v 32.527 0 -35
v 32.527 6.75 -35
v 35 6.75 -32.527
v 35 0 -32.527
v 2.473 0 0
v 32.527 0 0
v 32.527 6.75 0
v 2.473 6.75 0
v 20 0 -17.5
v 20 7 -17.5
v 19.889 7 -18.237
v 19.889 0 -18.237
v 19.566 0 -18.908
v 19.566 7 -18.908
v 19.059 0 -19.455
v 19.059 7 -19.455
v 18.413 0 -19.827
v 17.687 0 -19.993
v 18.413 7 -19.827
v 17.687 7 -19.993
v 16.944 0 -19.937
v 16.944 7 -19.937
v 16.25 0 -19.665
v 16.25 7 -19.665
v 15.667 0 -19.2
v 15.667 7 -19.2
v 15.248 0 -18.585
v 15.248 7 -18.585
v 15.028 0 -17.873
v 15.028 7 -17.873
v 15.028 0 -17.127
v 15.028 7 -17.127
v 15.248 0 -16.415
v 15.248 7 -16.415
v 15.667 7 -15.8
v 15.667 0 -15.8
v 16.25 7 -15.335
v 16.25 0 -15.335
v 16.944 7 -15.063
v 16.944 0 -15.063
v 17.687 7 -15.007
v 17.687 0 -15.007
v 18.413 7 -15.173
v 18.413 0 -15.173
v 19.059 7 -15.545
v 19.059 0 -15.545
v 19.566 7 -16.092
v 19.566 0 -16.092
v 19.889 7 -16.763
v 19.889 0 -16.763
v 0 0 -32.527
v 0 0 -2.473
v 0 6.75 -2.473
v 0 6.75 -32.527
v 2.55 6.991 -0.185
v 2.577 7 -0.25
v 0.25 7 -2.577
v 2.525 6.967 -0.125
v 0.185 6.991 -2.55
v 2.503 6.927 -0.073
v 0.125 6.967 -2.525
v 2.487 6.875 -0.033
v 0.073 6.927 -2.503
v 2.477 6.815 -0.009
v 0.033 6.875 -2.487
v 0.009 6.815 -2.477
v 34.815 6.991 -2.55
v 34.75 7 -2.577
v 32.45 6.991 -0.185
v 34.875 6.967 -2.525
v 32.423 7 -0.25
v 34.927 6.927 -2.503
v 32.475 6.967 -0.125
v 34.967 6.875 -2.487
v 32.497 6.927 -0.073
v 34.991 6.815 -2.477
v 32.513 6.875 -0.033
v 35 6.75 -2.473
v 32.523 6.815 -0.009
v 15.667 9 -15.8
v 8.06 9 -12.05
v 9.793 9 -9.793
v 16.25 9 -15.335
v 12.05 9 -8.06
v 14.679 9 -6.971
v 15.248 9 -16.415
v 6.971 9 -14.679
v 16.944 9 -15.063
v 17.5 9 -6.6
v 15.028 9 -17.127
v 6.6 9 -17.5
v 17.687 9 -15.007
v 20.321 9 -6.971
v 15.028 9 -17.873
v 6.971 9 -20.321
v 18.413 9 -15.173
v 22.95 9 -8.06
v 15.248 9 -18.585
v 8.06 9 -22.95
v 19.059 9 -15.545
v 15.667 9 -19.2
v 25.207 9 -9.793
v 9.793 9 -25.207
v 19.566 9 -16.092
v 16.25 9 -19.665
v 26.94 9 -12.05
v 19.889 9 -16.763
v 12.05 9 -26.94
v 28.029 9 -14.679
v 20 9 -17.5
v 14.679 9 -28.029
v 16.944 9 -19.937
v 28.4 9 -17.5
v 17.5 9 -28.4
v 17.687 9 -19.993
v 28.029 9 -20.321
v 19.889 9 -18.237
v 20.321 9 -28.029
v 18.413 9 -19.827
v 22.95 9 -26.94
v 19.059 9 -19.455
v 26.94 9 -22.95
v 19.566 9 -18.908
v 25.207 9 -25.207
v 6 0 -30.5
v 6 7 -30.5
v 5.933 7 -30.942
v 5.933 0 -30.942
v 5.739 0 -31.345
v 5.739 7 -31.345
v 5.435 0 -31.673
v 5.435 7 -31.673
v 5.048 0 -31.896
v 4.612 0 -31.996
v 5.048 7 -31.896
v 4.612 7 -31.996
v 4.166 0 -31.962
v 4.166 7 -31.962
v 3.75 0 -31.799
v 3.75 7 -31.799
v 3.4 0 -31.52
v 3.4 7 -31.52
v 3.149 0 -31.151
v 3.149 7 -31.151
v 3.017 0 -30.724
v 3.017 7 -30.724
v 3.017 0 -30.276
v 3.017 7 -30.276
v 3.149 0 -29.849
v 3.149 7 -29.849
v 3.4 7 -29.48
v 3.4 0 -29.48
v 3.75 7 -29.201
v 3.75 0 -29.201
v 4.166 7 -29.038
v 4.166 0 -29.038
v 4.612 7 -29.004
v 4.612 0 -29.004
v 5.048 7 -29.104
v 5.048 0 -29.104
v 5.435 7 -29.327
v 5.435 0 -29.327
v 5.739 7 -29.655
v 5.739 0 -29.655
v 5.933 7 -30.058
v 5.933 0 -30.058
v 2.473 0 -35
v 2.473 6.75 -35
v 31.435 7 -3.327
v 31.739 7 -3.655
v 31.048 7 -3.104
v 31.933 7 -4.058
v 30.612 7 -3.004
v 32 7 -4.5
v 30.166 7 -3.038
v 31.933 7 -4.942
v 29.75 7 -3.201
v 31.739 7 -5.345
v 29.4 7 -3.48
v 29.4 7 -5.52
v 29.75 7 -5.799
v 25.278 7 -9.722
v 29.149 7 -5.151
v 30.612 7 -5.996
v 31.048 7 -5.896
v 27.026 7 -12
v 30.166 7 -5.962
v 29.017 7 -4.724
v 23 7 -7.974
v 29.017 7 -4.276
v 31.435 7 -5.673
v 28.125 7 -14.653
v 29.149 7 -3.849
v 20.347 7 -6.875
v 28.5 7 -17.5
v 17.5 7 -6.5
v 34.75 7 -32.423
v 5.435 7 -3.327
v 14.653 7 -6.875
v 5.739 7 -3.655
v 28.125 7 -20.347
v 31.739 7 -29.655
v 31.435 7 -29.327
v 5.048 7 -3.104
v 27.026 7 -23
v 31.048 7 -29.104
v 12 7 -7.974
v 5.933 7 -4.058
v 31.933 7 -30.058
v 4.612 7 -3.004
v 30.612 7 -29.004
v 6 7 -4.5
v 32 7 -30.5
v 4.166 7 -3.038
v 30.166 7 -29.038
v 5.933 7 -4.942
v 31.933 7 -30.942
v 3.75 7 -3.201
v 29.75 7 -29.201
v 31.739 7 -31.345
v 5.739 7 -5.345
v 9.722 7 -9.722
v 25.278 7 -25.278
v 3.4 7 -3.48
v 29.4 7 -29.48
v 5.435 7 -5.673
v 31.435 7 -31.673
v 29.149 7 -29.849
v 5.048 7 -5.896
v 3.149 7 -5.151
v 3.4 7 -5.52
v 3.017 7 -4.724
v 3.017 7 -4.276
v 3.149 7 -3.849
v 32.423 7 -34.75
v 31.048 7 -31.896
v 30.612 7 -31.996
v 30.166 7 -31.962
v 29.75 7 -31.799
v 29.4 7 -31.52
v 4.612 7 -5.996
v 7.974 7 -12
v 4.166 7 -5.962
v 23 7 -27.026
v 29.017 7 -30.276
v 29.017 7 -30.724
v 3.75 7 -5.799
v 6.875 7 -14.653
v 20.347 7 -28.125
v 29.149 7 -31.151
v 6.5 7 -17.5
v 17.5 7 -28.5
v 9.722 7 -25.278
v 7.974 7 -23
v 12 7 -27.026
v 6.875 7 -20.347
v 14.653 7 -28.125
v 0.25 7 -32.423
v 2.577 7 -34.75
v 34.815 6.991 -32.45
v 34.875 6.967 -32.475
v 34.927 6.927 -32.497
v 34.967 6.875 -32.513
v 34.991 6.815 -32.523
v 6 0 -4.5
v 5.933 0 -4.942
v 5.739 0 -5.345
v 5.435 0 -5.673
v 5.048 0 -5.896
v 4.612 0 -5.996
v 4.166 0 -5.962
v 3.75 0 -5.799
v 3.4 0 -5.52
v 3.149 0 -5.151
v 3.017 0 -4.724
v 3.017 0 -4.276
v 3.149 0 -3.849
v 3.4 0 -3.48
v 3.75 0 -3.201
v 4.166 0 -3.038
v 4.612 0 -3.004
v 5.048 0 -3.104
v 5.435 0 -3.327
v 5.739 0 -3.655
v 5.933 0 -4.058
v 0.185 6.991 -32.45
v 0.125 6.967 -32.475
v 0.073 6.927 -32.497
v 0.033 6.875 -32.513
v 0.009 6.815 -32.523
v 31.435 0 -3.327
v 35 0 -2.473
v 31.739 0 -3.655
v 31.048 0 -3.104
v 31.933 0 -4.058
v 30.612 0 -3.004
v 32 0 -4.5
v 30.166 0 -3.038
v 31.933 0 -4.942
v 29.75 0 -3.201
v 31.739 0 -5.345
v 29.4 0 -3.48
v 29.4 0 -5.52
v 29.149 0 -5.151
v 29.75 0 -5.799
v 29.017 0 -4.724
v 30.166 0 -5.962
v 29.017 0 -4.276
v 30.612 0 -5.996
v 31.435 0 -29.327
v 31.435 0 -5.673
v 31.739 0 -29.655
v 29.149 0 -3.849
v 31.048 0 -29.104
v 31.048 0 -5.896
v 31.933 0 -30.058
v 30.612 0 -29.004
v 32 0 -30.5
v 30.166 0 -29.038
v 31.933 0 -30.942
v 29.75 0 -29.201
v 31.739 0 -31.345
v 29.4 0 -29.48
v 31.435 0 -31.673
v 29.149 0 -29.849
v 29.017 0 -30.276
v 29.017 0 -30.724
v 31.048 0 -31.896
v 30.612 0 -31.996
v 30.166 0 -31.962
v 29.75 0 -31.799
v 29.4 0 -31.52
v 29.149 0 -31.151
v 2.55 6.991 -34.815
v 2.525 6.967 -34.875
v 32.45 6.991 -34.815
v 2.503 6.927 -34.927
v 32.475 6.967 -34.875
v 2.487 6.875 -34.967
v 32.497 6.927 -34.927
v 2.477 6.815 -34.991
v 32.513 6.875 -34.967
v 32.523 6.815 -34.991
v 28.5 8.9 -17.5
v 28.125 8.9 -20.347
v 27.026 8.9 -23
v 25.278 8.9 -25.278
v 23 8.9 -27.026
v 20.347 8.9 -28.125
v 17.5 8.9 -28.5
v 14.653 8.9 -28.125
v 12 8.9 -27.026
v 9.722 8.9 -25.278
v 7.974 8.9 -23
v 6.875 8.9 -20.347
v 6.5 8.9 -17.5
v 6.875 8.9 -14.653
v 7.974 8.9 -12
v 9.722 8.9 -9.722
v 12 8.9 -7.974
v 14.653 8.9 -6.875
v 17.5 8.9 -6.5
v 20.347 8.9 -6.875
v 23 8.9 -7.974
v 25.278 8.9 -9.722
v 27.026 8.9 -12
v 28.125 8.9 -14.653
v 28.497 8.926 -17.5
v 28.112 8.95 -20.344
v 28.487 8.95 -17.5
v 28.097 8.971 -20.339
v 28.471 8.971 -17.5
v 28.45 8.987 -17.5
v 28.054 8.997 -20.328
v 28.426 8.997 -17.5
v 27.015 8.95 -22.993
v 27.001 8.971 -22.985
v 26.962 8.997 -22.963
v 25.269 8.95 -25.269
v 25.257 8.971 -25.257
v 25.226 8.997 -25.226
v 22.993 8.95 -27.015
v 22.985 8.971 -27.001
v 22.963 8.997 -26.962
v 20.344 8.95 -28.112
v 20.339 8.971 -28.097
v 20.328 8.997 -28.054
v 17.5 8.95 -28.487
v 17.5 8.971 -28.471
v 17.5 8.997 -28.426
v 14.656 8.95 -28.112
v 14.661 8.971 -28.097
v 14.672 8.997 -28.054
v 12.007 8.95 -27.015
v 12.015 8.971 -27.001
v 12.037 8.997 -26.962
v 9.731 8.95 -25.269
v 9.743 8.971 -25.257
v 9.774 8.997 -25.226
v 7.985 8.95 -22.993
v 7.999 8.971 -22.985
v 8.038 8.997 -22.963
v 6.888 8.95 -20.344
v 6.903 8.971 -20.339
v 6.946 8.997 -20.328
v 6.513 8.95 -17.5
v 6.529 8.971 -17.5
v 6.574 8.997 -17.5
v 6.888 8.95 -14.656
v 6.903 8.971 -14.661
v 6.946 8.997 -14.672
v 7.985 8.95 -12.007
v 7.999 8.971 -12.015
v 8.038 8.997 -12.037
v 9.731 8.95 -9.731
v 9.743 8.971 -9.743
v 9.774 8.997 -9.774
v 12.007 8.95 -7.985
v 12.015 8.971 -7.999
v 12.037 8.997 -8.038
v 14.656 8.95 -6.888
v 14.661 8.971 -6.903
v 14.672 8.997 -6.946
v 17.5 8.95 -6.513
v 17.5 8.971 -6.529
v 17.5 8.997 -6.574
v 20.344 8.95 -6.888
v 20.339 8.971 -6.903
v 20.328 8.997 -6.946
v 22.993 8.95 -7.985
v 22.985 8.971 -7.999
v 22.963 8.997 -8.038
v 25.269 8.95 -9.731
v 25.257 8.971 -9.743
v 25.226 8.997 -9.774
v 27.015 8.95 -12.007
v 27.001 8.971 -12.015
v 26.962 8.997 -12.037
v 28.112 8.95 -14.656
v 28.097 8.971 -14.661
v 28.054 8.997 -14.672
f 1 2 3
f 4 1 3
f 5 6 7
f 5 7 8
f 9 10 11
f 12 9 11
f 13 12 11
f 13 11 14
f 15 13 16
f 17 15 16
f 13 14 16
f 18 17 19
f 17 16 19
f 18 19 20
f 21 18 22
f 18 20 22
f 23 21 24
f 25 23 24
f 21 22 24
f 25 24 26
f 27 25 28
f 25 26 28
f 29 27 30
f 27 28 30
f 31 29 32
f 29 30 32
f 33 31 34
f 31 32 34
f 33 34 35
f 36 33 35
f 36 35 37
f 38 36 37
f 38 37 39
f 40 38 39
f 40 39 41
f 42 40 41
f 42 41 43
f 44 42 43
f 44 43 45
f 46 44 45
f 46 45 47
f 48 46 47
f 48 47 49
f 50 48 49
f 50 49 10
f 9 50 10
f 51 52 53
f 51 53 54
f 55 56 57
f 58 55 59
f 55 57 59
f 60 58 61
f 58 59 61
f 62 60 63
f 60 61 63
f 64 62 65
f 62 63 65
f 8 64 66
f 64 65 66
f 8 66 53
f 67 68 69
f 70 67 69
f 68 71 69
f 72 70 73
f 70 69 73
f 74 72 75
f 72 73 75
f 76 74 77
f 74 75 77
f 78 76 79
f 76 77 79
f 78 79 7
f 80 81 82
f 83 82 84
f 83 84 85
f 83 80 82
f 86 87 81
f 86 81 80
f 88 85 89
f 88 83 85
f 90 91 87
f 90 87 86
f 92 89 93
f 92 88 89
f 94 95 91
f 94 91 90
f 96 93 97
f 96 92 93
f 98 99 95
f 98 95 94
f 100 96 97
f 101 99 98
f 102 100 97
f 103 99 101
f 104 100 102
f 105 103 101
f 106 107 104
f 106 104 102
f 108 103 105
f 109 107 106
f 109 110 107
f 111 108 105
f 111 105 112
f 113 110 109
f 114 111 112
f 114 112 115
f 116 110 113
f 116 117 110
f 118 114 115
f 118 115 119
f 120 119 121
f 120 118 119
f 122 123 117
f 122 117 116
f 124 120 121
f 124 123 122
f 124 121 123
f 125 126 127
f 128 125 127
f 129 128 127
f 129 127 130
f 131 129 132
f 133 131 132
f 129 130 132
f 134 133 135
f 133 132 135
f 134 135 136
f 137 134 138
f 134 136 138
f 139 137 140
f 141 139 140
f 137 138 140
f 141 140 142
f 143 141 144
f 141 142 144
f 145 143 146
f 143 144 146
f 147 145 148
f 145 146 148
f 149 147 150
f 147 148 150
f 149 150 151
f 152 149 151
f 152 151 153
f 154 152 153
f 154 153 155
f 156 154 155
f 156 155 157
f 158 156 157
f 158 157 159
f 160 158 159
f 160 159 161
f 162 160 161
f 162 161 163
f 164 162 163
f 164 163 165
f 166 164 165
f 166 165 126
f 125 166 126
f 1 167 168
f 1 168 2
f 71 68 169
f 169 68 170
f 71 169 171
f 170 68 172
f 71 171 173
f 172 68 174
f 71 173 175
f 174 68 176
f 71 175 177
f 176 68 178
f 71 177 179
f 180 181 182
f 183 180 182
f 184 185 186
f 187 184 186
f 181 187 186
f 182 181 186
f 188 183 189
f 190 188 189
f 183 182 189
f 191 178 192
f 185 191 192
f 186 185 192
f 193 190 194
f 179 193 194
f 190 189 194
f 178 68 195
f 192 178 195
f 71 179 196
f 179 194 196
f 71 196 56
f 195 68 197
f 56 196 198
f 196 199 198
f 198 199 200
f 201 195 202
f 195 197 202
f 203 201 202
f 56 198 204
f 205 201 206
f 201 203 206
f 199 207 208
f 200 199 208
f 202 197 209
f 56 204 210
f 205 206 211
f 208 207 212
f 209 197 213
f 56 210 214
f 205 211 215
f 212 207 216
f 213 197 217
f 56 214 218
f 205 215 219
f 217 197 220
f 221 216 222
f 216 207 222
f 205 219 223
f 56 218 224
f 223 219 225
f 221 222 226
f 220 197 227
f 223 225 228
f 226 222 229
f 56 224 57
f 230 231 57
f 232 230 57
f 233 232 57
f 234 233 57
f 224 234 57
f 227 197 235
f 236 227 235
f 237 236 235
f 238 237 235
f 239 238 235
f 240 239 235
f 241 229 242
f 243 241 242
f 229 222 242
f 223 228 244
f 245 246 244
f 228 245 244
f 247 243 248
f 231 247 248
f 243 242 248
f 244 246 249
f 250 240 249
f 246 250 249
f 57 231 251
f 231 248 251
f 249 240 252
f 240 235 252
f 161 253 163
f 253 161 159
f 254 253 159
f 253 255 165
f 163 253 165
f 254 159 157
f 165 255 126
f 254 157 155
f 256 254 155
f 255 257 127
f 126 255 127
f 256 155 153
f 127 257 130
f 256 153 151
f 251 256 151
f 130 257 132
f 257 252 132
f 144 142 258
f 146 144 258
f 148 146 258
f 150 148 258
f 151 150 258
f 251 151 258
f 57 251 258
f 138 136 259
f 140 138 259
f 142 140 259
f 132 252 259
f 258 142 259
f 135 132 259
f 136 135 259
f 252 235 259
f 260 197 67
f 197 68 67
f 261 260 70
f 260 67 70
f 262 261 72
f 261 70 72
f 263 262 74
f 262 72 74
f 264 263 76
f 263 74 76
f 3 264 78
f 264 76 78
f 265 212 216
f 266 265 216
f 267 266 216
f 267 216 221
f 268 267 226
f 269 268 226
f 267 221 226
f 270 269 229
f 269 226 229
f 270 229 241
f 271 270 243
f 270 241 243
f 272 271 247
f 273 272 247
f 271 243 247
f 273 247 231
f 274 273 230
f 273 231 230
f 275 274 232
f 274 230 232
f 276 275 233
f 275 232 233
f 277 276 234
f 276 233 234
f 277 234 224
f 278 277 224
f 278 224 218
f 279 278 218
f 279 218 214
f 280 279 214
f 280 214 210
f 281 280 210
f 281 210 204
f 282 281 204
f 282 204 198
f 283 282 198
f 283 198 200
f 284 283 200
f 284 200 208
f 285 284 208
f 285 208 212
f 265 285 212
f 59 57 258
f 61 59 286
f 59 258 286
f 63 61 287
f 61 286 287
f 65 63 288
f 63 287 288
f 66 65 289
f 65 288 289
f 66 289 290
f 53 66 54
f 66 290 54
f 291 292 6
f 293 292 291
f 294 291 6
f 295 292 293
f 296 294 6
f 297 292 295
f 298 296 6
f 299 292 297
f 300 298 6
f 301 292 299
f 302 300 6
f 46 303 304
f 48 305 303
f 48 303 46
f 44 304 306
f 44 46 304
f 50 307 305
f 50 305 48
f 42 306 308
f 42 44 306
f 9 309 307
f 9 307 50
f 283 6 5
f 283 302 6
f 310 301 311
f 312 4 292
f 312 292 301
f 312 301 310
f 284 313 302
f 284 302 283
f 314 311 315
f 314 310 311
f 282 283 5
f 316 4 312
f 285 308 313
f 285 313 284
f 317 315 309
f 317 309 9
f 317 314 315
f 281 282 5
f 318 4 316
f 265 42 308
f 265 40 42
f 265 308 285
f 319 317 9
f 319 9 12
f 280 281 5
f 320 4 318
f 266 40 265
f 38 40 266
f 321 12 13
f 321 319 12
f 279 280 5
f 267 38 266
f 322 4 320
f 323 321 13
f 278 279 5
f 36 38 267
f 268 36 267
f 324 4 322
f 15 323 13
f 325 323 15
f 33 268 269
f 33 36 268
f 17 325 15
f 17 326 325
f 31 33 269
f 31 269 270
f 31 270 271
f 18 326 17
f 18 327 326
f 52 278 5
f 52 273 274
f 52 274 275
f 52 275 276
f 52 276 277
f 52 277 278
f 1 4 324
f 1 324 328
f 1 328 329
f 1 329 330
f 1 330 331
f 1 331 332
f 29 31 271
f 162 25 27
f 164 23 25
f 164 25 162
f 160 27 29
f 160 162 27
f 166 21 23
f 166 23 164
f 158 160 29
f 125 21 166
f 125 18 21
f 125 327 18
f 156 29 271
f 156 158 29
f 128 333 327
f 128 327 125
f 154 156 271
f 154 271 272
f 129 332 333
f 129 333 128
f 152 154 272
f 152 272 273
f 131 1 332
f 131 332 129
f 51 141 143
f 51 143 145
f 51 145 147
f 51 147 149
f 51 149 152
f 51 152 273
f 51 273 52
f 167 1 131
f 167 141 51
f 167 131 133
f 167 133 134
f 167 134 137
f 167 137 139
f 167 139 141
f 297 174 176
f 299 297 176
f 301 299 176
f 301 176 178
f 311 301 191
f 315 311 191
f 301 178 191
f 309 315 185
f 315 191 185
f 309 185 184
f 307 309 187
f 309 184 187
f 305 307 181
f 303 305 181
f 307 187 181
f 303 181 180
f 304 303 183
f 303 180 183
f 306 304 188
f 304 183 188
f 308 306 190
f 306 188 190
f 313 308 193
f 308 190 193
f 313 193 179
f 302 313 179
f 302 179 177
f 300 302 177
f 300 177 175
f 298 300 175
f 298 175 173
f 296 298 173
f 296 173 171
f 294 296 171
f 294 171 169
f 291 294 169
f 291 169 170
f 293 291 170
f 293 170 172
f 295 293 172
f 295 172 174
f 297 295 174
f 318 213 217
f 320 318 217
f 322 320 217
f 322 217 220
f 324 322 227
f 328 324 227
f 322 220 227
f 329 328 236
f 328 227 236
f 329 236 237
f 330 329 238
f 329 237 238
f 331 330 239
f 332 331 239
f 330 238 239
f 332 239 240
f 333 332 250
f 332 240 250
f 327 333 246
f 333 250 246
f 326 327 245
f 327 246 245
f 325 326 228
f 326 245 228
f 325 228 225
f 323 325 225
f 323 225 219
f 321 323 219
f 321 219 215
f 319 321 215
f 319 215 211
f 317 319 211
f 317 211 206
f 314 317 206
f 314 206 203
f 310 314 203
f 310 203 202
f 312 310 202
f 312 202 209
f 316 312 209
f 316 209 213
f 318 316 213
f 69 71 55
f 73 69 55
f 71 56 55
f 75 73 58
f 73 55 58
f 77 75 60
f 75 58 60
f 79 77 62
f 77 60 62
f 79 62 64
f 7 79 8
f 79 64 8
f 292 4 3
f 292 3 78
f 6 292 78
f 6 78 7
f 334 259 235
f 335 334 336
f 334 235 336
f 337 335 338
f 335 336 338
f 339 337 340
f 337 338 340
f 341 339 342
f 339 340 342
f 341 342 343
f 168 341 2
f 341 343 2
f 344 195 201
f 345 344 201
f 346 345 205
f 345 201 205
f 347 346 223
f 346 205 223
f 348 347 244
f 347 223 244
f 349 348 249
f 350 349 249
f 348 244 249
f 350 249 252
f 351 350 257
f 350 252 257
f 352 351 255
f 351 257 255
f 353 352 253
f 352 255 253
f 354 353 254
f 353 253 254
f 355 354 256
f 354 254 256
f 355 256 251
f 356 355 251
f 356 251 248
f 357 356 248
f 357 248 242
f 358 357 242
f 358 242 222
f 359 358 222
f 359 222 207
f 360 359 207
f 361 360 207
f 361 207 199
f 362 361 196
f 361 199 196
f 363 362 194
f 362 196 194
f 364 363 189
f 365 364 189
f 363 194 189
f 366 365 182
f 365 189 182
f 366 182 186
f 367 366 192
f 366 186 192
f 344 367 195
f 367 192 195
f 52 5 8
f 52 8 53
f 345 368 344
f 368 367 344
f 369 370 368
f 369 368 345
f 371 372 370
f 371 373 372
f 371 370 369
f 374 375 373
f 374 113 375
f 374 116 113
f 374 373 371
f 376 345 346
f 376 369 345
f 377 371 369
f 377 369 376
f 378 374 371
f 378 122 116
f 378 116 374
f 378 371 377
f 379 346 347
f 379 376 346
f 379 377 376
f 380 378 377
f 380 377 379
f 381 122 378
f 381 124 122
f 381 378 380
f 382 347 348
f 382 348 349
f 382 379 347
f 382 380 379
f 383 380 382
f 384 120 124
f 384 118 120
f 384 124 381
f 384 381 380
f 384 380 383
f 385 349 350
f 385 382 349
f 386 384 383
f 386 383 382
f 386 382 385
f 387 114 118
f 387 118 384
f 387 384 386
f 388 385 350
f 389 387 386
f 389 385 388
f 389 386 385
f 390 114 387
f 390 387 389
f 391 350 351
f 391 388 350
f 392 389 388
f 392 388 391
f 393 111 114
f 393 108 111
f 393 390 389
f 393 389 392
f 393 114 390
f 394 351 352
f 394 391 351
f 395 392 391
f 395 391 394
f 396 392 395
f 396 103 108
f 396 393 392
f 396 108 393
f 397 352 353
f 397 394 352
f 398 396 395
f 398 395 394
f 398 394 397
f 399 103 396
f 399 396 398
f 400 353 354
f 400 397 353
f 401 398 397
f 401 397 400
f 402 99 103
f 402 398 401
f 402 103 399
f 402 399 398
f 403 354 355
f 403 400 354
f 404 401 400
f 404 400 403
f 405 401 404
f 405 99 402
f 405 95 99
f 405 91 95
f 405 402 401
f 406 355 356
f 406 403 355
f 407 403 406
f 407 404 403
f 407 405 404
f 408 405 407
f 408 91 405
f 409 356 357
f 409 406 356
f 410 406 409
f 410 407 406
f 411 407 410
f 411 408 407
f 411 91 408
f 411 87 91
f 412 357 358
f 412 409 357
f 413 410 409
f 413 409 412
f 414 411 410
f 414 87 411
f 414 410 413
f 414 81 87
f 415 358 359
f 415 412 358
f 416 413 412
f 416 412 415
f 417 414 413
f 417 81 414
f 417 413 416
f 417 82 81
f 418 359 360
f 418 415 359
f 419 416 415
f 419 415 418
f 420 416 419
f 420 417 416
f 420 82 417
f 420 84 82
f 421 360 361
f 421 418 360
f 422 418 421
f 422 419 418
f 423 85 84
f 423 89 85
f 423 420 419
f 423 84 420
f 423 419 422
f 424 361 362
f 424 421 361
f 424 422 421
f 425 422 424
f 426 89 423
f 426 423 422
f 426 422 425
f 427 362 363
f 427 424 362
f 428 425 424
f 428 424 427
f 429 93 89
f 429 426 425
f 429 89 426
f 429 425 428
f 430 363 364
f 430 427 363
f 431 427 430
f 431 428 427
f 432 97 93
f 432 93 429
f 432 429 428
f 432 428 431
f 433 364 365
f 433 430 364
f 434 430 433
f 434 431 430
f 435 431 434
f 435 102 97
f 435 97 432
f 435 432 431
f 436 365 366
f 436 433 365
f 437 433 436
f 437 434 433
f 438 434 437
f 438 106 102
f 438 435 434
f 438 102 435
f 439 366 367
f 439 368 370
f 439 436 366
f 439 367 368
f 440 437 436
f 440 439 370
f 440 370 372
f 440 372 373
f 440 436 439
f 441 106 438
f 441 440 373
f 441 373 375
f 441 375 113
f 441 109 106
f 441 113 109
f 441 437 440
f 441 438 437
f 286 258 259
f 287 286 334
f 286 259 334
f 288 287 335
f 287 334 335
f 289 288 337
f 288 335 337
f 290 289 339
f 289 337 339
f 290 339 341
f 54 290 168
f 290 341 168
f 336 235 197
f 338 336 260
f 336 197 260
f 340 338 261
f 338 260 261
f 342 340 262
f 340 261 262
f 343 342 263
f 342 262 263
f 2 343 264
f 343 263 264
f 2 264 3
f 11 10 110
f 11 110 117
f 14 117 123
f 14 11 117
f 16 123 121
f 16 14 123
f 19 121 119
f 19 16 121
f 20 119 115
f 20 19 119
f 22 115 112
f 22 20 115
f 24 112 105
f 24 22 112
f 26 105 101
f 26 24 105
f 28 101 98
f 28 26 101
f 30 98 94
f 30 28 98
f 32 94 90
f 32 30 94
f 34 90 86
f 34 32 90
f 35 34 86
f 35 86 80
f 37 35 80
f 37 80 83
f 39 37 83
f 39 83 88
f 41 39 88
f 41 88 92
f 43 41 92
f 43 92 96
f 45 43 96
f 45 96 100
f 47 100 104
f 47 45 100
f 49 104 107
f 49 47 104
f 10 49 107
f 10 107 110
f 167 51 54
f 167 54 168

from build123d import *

# Parameters (mm, degrees)
SALIENTE_EXTRUIR1_DEPTH = 7
CROQUIS2_R              = 2.5
CORTAR_EXTRUIR1_DEPTH   = 8
CROQUIS3_R              = 1.5
CORTAR_EXTRUIR2_DEPTH   = 8
CROQUIS4_R              = 11
CROQUIS4_R_2            = 2.5
SALIENTE_EXTRUIR2_DEPTH = 2
REDONDEO1_R             = 0.1
REDONDEO3_R             = 0.25


with BuildPart() as part:
    # Croquis1 → Saliente-Extruir1 (new body)
    with BuildSketch(Plane(origin=(0, 0, 0), x_dir=(1, 0, 0), z_dir=(0, 1, 0))):
        Polygon((0, 32.526911935), (2.473088065, 35), (32.526911935, 35), (35, 32.526911935), (35, 2.473088065), (32.526911935, 0), (2.473088065, 0), (0, 2.473088065), align=None)
    extrude(amount=SALIENTE_EXTRUIR1_DEPTH)

    # Croquis2 → Cortar-Extruir1 (cut, through all)
    with BuildSketch(Plane(origin=(0, 7, 0), x_dir=(1, 0, 0), z_dir=(0, 1, 0))):
        with Locations((17.5, 17.5)):
            Circle(CROQUIS2_R)
    extrude(amount=-CORTAR_EXTRUIR1_DEPTH, mode=Mode.SUBTRACT)

    # Croquis3 → Cortar-Extruir2 (cut, through all)
    with BuildSketch(Plane(origin=(0, 7, 0), x_dir=(1, 0, 0), z_dir=(0, 1, 0))):
        with Locations((4.5, 30.5)):
            Circle(CROQUIS3_R)
        with Locations((30.5, 30.5)):
            Circle(CROQUIS3_R)
        with Locations((30.5, 4.5)):
            Circle(CROQUIS3_R)
        with Locations((4.5, 4.5)):
            Circle(CROQUIS3_R)
    extrude(amount=-CORTAR_EXTRUIR2_DEPTH, mode=Mode.SUBTRACT)

    # Croquis4 → Saliente-Extruir2 (add)
    with BuildSketch(Plane(origin=(0, 7, 0), x_dir=(1, 0, 0), z_dir=(0, 1, 0))):
        with Locations((17.5, 17.5)):
            Circle(CROQUIS4_R)
        with Locations((17.5, 17.5)):
            Circle(CROQUIS4_R_2, mode=Mode.SUBTRACT)
    extrude(amount=SALIENTE_EXTRUIR2_DEPTH)

    # Redondeo1
    redondeo1_edges = [part.edges().sort_by_distance(p)[0] for p in [
        (6.5, 9, -17.5),
    ]]
    fillet(redondeo1_edges, radius=REDONDEO1_R)

    # Redondeo3
    redondeo3_edges = [part.edges().sort_by_distance(p)[0] for p in [
        (17.5, 7, 0),
        (33.763455967, 7, -1.236544033),
        (35, 7, -17.5),
        (33.763455967, 7, -33.763455967),
        (17.5, 7, -35),
        (1.236544033, 7, -33.763455967),
        (0, 7, -17.5),
        (1.236544033, 7, -1.236544033),
    ]]
    fillet(redondeo3_edges, radius=REDONDEO3_R)


solid = part.part
